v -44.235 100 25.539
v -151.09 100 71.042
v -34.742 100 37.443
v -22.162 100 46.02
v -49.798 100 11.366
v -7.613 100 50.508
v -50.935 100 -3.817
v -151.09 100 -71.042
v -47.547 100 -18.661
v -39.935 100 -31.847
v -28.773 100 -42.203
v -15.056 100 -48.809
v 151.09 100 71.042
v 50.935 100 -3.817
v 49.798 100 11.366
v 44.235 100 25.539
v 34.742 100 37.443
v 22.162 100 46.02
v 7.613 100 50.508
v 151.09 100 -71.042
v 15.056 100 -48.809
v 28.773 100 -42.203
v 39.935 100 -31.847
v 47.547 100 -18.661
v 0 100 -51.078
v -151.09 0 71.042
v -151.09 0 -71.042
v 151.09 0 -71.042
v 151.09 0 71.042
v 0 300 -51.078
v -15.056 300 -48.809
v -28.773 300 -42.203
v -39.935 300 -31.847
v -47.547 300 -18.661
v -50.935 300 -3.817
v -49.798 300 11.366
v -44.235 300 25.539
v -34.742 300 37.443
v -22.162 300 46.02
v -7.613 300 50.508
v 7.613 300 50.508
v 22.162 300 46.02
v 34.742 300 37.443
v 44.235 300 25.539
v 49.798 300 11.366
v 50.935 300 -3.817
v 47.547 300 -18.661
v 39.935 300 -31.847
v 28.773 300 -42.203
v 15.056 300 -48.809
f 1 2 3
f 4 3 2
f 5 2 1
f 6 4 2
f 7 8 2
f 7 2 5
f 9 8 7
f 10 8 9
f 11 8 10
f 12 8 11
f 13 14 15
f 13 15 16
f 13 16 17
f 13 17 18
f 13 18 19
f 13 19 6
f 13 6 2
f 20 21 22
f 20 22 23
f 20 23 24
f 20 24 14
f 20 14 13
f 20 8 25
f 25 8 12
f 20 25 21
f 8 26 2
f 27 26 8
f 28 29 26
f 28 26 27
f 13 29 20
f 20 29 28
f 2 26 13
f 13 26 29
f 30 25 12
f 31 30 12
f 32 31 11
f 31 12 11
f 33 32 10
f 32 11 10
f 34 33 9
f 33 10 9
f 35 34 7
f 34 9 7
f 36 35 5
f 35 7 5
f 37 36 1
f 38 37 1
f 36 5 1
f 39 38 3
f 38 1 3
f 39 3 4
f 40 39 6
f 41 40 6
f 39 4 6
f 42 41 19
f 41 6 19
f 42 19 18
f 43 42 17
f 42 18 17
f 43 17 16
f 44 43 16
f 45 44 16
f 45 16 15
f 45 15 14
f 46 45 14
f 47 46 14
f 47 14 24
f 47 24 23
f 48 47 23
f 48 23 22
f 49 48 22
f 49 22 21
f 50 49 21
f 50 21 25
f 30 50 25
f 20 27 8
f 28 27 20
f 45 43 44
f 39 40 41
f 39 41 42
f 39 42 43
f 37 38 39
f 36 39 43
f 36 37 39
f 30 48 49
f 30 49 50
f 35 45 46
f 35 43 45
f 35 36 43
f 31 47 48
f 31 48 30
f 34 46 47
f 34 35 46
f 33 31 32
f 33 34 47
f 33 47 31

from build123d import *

# Parameters (mm, degrees)
SKETCH_2_W      = 302.180498412
SKETCH_2_H      = 142.083514116
EXTRUDE_1_DEPTH = 100
SKETCH_2_3_R    = 51.07818505
EXTRUDE_2_DEPTH = 300


with BuildPart() as part:
    # 草图2 → 凸台-拉伸1 (new body)
    with BuildSketch(Plane(origin=(0, 0, 0), x_dir=(1, 0, 0), z_dir=(0, 1, 0))):
        Rectangle(SKETCH_2_W, SKETCH_2_H)
    extrude(amount=EXTRUDE_1_DEPTH)

    # 草图2<3> → 凸台-拉伸2 (add)
    with BuildSketch(Plane(origin=(0, 0, 0), x_dir=(1, 0, 0), z_dir=(0, 1, 0))):
        Circle(SKETCH_2_3_R)
    extrude(amount=EXTRUDE_2_DEPTH)


solid = part.part
